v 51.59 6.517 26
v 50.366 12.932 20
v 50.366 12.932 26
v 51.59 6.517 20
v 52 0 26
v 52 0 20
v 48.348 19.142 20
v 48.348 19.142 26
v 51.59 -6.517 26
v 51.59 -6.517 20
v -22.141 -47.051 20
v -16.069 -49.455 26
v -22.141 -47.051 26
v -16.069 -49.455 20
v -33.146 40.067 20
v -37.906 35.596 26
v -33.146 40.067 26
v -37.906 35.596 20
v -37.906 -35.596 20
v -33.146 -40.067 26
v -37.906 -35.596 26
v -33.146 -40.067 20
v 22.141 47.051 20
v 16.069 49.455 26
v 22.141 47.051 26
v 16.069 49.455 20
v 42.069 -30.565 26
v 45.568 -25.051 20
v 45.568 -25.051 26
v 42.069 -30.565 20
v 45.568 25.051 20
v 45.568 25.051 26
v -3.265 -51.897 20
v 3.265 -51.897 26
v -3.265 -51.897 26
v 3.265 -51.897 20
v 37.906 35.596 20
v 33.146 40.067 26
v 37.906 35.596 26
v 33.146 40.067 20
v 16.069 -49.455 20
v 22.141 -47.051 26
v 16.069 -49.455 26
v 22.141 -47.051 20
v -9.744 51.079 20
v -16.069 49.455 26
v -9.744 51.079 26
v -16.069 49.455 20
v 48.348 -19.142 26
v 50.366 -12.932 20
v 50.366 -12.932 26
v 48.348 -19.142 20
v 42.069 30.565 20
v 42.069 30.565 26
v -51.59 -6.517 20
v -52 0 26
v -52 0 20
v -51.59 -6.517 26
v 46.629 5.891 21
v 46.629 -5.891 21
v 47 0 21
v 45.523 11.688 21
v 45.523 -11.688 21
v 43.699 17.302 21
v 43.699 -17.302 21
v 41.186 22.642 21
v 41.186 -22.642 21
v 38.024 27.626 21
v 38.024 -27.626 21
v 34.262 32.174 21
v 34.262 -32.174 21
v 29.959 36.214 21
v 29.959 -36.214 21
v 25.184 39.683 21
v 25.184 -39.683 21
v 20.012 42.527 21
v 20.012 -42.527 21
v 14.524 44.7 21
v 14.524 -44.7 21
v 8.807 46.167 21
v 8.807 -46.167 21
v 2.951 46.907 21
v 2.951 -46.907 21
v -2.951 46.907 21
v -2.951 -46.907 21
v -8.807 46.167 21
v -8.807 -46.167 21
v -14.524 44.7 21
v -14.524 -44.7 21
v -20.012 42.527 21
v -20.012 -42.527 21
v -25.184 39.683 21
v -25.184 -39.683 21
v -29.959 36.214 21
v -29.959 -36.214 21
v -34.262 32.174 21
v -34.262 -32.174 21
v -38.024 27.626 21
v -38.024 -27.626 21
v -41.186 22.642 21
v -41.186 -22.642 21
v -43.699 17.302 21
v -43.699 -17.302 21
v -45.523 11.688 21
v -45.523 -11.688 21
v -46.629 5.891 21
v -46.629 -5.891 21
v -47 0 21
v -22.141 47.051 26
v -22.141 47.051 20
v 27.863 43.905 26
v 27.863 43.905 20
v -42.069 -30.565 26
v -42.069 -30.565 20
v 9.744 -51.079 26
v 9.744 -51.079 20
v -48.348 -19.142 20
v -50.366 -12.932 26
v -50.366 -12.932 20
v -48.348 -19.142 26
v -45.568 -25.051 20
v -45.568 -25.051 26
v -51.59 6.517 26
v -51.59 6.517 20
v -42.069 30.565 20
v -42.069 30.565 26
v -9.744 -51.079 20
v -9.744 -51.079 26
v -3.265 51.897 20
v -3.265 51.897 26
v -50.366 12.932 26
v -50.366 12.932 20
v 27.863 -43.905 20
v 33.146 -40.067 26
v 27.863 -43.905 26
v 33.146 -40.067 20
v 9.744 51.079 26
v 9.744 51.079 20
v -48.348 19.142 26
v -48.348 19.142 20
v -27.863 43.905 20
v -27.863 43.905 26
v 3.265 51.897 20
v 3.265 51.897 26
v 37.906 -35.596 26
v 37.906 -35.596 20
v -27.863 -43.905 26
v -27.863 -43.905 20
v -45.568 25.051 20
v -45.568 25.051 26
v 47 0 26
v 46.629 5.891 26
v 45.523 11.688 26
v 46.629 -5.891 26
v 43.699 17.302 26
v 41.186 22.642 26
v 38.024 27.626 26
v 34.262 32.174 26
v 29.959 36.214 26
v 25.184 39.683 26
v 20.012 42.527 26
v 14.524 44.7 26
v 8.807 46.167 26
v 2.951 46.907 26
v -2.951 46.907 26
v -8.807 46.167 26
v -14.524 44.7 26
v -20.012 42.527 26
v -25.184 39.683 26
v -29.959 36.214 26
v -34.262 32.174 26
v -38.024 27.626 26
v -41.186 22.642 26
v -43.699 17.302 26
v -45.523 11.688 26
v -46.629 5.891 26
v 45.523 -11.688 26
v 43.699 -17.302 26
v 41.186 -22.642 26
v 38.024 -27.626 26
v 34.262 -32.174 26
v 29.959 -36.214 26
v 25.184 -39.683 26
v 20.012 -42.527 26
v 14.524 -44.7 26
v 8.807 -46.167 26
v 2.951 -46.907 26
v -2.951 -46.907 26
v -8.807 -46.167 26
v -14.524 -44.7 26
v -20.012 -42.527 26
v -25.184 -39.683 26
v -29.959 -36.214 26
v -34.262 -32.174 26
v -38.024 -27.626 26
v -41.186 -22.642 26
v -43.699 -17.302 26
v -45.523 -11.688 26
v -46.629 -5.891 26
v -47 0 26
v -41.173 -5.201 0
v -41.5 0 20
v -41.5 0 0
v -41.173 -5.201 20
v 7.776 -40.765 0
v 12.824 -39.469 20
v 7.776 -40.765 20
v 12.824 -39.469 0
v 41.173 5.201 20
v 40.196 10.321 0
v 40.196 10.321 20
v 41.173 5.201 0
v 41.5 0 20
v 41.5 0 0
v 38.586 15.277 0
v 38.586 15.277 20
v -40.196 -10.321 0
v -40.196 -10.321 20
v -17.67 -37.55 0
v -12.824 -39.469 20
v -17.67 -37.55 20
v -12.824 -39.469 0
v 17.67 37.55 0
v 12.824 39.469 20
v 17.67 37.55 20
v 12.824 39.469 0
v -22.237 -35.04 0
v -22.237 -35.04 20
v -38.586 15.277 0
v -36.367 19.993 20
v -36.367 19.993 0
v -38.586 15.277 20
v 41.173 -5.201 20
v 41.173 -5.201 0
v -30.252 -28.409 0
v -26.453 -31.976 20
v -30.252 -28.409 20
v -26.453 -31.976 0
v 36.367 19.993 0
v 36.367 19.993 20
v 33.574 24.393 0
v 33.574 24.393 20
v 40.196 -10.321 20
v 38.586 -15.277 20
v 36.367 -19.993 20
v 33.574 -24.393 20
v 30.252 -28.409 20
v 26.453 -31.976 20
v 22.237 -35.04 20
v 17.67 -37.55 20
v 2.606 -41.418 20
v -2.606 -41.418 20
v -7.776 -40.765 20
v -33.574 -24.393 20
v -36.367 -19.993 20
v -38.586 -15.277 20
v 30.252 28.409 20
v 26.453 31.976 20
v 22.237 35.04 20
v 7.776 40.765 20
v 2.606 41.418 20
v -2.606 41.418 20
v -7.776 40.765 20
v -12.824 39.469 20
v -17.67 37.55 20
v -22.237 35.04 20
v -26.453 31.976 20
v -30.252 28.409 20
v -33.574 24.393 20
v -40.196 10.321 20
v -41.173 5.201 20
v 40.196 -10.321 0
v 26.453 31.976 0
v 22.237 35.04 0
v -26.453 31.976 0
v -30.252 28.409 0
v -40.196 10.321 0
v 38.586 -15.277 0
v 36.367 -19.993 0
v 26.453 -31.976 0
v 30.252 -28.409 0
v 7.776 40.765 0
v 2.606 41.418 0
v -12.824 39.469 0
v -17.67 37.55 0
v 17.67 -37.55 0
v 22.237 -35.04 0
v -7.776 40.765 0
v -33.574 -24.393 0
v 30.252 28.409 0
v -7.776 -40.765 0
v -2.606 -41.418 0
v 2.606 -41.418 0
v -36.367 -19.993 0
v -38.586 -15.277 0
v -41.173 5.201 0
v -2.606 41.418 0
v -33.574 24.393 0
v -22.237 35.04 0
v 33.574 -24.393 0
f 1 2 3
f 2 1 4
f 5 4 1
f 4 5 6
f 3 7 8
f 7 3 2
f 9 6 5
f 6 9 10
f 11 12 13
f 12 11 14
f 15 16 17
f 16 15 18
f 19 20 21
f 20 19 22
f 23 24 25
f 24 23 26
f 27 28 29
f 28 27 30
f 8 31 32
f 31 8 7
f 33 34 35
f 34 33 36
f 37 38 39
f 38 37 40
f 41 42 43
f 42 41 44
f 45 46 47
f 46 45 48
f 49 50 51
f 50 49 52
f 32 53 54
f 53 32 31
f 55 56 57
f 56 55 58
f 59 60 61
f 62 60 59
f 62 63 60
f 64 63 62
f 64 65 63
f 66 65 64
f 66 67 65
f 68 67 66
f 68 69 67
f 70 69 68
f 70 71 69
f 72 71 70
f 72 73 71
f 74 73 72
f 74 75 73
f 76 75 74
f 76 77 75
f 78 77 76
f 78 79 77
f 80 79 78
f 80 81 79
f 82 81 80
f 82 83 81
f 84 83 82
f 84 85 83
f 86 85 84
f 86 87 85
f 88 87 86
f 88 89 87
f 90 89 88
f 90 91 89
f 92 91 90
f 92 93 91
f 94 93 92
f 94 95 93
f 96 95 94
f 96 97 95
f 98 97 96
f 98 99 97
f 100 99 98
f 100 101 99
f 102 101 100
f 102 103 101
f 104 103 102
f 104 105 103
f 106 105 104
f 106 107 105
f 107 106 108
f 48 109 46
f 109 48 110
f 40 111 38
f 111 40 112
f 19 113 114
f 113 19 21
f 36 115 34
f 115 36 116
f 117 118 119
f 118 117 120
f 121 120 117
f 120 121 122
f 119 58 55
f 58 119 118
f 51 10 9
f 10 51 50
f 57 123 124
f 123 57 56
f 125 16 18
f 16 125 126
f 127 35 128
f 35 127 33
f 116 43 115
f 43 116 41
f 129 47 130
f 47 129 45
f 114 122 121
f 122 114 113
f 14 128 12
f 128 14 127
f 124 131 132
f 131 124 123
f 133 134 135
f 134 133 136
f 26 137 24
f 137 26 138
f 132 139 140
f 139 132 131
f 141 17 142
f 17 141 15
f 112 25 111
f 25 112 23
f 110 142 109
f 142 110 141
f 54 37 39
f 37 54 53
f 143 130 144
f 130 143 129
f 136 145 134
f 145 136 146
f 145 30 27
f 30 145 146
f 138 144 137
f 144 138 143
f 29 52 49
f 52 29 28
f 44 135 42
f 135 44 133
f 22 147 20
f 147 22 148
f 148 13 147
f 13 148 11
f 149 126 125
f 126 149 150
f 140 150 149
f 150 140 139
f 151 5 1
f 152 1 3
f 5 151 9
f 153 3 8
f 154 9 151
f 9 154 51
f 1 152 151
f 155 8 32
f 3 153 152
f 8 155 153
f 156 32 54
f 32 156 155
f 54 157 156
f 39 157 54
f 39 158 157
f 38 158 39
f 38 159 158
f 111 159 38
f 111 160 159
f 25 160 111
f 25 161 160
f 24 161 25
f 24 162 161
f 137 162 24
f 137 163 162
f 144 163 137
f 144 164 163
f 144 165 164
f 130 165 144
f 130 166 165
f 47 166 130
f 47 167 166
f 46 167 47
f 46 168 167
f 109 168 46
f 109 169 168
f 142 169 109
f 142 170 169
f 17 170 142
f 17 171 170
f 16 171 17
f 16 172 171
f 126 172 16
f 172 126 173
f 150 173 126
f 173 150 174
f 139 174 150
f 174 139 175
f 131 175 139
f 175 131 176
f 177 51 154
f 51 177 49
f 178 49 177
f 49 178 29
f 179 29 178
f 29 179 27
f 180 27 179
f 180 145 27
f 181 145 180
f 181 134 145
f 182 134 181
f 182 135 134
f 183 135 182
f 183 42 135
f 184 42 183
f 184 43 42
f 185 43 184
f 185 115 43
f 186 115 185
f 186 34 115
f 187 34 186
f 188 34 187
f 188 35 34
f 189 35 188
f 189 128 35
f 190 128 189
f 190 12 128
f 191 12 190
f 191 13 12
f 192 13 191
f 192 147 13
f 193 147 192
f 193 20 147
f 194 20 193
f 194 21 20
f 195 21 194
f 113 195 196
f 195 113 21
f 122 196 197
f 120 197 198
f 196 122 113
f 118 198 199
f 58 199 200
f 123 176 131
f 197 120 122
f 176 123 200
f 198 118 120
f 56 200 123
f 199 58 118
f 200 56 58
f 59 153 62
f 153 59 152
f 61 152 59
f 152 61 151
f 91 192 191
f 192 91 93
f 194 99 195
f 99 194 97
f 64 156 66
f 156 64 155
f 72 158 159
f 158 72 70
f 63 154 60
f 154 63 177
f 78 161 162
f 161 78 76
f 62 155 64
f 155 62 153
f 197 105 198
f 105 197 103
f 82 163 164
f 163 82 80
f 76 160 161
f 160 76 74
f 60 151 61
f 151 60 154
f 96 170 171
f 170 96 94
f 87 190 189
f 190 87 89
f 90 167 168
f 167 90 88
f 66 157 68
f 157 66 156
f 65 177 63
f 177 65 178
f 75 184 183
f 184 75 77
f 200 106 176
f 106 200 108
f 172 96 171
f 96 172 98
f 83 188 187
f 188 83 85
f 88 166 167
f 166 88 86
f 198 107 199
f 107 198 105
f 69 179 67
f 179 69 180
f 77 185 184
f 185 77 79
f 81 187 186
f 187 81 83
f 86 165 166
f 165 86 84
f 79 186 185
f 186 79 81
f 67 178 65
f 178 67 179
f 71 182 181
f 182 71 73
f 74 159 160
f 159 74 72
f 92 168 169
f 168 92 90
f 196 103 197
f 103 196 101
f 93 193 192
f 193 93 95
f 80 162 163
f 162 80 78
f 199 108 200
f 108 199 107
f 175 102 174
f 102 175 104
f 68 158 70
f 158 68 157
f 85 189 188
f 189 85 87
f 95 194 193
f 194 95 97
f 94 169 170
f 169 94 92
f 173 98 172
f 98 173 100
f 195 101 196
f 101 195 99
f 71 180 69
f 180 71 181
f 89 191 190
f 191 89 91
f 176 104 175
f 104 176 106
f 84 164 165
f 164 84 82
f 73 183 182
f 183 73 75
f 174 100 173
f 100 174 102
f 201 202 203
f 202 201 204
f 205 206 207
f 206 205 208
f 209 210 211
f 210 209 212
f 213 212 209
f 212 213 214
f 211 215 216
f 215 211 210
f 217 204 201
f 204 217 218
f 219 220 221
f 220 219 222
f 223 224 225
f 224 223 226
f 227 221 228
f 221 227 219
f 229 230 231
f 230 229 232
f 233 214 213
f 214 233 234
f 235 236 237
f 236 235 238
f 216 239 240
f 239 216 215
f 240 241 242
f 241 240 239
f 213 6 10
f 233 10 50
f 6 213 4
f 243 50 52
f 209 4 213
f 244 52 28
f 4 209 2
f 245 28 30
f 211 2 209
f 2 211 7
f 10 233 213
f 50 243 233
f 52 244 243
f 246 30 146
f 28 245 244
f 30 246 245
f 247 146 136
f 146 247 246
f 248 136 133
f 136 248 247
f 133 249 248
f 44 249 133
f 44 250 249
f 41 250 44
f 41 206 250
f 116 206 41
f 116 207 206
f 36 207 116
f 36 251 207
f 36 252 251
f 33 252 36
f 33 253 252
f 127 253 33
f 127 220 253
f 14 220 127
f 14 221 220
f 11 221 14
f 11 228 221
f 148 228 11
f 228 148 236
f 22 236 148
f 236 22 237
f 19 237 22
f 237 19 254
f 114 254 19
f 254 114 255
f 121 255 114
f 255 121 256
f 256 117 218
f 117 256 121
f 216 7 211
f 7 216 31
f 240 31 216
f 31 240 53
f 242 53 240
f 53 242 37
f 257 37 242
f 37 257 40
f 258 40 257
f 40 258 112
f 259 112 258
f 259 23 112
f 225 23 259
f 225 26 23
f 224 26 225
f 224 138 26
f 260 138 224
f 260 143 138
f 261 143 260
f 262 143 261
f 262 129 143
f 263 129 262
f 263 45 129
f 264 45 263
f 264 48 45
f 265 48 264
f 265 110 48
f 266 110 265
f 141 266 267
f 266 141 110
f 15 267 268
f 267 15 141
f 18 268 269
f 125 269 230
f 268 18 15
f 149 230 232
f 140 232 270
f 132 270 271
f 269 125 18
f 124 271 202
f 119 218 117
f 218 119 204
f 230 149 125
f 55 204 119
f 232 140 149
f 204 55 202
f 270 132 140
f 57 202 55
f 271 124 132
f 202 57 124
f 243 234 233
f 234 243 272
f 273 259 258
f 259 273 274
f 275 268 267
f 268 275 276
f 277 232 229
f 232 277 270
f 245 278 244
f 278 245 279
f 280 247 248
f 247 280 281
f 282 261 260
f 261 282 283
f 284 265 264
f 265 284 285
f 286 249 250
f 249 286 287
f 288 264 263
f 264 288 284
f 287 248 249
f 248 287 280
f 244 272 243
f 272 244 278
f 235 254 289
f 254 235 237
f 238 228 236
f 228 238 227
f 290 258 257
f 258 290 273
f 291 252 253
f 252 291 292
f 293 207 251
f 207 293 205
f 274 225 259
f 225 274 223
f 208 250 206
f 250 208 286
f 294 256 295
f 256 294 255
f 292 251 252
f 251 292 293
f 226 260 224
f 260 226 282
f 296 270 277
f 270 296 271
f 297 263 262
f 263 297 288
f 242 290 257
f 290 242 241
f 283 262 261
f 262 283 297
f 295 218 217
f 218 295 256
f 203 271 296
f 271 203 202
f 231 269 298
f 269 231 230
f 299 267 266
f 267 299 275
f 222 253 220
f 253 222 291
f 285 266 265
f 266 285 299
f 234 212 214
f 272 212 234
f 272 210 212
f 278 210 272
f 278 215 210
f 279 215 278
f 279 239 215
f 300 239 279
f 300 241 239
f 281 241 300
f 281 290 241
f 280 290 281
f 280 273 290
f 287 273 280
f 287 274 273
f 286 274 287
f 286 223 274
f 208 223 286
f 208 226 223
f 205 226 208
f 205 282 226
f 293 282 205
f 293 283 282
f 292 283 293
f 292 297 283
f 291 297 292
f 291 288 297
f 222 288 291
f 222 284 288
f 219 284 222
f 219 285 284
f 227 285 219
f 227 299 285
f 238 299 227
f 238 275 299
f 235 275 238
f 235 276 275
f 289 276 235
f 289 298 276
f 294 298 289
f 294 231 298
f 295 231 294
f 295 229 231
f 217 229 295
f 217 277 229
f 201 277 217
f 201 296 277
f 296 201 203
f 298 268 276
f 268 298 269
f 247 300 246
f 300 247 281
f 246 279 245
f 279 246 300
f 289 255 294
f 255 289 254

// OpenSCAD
$fn=50;
    cylinder(r=41.5, h= 20);

translate([0,0,20]) 
cylinder(r=52,h=1);
translate([0,0,21]) 
difference() {
    cylinder(r=52,h=5);
    cylinder(r=47,h=5);
}
